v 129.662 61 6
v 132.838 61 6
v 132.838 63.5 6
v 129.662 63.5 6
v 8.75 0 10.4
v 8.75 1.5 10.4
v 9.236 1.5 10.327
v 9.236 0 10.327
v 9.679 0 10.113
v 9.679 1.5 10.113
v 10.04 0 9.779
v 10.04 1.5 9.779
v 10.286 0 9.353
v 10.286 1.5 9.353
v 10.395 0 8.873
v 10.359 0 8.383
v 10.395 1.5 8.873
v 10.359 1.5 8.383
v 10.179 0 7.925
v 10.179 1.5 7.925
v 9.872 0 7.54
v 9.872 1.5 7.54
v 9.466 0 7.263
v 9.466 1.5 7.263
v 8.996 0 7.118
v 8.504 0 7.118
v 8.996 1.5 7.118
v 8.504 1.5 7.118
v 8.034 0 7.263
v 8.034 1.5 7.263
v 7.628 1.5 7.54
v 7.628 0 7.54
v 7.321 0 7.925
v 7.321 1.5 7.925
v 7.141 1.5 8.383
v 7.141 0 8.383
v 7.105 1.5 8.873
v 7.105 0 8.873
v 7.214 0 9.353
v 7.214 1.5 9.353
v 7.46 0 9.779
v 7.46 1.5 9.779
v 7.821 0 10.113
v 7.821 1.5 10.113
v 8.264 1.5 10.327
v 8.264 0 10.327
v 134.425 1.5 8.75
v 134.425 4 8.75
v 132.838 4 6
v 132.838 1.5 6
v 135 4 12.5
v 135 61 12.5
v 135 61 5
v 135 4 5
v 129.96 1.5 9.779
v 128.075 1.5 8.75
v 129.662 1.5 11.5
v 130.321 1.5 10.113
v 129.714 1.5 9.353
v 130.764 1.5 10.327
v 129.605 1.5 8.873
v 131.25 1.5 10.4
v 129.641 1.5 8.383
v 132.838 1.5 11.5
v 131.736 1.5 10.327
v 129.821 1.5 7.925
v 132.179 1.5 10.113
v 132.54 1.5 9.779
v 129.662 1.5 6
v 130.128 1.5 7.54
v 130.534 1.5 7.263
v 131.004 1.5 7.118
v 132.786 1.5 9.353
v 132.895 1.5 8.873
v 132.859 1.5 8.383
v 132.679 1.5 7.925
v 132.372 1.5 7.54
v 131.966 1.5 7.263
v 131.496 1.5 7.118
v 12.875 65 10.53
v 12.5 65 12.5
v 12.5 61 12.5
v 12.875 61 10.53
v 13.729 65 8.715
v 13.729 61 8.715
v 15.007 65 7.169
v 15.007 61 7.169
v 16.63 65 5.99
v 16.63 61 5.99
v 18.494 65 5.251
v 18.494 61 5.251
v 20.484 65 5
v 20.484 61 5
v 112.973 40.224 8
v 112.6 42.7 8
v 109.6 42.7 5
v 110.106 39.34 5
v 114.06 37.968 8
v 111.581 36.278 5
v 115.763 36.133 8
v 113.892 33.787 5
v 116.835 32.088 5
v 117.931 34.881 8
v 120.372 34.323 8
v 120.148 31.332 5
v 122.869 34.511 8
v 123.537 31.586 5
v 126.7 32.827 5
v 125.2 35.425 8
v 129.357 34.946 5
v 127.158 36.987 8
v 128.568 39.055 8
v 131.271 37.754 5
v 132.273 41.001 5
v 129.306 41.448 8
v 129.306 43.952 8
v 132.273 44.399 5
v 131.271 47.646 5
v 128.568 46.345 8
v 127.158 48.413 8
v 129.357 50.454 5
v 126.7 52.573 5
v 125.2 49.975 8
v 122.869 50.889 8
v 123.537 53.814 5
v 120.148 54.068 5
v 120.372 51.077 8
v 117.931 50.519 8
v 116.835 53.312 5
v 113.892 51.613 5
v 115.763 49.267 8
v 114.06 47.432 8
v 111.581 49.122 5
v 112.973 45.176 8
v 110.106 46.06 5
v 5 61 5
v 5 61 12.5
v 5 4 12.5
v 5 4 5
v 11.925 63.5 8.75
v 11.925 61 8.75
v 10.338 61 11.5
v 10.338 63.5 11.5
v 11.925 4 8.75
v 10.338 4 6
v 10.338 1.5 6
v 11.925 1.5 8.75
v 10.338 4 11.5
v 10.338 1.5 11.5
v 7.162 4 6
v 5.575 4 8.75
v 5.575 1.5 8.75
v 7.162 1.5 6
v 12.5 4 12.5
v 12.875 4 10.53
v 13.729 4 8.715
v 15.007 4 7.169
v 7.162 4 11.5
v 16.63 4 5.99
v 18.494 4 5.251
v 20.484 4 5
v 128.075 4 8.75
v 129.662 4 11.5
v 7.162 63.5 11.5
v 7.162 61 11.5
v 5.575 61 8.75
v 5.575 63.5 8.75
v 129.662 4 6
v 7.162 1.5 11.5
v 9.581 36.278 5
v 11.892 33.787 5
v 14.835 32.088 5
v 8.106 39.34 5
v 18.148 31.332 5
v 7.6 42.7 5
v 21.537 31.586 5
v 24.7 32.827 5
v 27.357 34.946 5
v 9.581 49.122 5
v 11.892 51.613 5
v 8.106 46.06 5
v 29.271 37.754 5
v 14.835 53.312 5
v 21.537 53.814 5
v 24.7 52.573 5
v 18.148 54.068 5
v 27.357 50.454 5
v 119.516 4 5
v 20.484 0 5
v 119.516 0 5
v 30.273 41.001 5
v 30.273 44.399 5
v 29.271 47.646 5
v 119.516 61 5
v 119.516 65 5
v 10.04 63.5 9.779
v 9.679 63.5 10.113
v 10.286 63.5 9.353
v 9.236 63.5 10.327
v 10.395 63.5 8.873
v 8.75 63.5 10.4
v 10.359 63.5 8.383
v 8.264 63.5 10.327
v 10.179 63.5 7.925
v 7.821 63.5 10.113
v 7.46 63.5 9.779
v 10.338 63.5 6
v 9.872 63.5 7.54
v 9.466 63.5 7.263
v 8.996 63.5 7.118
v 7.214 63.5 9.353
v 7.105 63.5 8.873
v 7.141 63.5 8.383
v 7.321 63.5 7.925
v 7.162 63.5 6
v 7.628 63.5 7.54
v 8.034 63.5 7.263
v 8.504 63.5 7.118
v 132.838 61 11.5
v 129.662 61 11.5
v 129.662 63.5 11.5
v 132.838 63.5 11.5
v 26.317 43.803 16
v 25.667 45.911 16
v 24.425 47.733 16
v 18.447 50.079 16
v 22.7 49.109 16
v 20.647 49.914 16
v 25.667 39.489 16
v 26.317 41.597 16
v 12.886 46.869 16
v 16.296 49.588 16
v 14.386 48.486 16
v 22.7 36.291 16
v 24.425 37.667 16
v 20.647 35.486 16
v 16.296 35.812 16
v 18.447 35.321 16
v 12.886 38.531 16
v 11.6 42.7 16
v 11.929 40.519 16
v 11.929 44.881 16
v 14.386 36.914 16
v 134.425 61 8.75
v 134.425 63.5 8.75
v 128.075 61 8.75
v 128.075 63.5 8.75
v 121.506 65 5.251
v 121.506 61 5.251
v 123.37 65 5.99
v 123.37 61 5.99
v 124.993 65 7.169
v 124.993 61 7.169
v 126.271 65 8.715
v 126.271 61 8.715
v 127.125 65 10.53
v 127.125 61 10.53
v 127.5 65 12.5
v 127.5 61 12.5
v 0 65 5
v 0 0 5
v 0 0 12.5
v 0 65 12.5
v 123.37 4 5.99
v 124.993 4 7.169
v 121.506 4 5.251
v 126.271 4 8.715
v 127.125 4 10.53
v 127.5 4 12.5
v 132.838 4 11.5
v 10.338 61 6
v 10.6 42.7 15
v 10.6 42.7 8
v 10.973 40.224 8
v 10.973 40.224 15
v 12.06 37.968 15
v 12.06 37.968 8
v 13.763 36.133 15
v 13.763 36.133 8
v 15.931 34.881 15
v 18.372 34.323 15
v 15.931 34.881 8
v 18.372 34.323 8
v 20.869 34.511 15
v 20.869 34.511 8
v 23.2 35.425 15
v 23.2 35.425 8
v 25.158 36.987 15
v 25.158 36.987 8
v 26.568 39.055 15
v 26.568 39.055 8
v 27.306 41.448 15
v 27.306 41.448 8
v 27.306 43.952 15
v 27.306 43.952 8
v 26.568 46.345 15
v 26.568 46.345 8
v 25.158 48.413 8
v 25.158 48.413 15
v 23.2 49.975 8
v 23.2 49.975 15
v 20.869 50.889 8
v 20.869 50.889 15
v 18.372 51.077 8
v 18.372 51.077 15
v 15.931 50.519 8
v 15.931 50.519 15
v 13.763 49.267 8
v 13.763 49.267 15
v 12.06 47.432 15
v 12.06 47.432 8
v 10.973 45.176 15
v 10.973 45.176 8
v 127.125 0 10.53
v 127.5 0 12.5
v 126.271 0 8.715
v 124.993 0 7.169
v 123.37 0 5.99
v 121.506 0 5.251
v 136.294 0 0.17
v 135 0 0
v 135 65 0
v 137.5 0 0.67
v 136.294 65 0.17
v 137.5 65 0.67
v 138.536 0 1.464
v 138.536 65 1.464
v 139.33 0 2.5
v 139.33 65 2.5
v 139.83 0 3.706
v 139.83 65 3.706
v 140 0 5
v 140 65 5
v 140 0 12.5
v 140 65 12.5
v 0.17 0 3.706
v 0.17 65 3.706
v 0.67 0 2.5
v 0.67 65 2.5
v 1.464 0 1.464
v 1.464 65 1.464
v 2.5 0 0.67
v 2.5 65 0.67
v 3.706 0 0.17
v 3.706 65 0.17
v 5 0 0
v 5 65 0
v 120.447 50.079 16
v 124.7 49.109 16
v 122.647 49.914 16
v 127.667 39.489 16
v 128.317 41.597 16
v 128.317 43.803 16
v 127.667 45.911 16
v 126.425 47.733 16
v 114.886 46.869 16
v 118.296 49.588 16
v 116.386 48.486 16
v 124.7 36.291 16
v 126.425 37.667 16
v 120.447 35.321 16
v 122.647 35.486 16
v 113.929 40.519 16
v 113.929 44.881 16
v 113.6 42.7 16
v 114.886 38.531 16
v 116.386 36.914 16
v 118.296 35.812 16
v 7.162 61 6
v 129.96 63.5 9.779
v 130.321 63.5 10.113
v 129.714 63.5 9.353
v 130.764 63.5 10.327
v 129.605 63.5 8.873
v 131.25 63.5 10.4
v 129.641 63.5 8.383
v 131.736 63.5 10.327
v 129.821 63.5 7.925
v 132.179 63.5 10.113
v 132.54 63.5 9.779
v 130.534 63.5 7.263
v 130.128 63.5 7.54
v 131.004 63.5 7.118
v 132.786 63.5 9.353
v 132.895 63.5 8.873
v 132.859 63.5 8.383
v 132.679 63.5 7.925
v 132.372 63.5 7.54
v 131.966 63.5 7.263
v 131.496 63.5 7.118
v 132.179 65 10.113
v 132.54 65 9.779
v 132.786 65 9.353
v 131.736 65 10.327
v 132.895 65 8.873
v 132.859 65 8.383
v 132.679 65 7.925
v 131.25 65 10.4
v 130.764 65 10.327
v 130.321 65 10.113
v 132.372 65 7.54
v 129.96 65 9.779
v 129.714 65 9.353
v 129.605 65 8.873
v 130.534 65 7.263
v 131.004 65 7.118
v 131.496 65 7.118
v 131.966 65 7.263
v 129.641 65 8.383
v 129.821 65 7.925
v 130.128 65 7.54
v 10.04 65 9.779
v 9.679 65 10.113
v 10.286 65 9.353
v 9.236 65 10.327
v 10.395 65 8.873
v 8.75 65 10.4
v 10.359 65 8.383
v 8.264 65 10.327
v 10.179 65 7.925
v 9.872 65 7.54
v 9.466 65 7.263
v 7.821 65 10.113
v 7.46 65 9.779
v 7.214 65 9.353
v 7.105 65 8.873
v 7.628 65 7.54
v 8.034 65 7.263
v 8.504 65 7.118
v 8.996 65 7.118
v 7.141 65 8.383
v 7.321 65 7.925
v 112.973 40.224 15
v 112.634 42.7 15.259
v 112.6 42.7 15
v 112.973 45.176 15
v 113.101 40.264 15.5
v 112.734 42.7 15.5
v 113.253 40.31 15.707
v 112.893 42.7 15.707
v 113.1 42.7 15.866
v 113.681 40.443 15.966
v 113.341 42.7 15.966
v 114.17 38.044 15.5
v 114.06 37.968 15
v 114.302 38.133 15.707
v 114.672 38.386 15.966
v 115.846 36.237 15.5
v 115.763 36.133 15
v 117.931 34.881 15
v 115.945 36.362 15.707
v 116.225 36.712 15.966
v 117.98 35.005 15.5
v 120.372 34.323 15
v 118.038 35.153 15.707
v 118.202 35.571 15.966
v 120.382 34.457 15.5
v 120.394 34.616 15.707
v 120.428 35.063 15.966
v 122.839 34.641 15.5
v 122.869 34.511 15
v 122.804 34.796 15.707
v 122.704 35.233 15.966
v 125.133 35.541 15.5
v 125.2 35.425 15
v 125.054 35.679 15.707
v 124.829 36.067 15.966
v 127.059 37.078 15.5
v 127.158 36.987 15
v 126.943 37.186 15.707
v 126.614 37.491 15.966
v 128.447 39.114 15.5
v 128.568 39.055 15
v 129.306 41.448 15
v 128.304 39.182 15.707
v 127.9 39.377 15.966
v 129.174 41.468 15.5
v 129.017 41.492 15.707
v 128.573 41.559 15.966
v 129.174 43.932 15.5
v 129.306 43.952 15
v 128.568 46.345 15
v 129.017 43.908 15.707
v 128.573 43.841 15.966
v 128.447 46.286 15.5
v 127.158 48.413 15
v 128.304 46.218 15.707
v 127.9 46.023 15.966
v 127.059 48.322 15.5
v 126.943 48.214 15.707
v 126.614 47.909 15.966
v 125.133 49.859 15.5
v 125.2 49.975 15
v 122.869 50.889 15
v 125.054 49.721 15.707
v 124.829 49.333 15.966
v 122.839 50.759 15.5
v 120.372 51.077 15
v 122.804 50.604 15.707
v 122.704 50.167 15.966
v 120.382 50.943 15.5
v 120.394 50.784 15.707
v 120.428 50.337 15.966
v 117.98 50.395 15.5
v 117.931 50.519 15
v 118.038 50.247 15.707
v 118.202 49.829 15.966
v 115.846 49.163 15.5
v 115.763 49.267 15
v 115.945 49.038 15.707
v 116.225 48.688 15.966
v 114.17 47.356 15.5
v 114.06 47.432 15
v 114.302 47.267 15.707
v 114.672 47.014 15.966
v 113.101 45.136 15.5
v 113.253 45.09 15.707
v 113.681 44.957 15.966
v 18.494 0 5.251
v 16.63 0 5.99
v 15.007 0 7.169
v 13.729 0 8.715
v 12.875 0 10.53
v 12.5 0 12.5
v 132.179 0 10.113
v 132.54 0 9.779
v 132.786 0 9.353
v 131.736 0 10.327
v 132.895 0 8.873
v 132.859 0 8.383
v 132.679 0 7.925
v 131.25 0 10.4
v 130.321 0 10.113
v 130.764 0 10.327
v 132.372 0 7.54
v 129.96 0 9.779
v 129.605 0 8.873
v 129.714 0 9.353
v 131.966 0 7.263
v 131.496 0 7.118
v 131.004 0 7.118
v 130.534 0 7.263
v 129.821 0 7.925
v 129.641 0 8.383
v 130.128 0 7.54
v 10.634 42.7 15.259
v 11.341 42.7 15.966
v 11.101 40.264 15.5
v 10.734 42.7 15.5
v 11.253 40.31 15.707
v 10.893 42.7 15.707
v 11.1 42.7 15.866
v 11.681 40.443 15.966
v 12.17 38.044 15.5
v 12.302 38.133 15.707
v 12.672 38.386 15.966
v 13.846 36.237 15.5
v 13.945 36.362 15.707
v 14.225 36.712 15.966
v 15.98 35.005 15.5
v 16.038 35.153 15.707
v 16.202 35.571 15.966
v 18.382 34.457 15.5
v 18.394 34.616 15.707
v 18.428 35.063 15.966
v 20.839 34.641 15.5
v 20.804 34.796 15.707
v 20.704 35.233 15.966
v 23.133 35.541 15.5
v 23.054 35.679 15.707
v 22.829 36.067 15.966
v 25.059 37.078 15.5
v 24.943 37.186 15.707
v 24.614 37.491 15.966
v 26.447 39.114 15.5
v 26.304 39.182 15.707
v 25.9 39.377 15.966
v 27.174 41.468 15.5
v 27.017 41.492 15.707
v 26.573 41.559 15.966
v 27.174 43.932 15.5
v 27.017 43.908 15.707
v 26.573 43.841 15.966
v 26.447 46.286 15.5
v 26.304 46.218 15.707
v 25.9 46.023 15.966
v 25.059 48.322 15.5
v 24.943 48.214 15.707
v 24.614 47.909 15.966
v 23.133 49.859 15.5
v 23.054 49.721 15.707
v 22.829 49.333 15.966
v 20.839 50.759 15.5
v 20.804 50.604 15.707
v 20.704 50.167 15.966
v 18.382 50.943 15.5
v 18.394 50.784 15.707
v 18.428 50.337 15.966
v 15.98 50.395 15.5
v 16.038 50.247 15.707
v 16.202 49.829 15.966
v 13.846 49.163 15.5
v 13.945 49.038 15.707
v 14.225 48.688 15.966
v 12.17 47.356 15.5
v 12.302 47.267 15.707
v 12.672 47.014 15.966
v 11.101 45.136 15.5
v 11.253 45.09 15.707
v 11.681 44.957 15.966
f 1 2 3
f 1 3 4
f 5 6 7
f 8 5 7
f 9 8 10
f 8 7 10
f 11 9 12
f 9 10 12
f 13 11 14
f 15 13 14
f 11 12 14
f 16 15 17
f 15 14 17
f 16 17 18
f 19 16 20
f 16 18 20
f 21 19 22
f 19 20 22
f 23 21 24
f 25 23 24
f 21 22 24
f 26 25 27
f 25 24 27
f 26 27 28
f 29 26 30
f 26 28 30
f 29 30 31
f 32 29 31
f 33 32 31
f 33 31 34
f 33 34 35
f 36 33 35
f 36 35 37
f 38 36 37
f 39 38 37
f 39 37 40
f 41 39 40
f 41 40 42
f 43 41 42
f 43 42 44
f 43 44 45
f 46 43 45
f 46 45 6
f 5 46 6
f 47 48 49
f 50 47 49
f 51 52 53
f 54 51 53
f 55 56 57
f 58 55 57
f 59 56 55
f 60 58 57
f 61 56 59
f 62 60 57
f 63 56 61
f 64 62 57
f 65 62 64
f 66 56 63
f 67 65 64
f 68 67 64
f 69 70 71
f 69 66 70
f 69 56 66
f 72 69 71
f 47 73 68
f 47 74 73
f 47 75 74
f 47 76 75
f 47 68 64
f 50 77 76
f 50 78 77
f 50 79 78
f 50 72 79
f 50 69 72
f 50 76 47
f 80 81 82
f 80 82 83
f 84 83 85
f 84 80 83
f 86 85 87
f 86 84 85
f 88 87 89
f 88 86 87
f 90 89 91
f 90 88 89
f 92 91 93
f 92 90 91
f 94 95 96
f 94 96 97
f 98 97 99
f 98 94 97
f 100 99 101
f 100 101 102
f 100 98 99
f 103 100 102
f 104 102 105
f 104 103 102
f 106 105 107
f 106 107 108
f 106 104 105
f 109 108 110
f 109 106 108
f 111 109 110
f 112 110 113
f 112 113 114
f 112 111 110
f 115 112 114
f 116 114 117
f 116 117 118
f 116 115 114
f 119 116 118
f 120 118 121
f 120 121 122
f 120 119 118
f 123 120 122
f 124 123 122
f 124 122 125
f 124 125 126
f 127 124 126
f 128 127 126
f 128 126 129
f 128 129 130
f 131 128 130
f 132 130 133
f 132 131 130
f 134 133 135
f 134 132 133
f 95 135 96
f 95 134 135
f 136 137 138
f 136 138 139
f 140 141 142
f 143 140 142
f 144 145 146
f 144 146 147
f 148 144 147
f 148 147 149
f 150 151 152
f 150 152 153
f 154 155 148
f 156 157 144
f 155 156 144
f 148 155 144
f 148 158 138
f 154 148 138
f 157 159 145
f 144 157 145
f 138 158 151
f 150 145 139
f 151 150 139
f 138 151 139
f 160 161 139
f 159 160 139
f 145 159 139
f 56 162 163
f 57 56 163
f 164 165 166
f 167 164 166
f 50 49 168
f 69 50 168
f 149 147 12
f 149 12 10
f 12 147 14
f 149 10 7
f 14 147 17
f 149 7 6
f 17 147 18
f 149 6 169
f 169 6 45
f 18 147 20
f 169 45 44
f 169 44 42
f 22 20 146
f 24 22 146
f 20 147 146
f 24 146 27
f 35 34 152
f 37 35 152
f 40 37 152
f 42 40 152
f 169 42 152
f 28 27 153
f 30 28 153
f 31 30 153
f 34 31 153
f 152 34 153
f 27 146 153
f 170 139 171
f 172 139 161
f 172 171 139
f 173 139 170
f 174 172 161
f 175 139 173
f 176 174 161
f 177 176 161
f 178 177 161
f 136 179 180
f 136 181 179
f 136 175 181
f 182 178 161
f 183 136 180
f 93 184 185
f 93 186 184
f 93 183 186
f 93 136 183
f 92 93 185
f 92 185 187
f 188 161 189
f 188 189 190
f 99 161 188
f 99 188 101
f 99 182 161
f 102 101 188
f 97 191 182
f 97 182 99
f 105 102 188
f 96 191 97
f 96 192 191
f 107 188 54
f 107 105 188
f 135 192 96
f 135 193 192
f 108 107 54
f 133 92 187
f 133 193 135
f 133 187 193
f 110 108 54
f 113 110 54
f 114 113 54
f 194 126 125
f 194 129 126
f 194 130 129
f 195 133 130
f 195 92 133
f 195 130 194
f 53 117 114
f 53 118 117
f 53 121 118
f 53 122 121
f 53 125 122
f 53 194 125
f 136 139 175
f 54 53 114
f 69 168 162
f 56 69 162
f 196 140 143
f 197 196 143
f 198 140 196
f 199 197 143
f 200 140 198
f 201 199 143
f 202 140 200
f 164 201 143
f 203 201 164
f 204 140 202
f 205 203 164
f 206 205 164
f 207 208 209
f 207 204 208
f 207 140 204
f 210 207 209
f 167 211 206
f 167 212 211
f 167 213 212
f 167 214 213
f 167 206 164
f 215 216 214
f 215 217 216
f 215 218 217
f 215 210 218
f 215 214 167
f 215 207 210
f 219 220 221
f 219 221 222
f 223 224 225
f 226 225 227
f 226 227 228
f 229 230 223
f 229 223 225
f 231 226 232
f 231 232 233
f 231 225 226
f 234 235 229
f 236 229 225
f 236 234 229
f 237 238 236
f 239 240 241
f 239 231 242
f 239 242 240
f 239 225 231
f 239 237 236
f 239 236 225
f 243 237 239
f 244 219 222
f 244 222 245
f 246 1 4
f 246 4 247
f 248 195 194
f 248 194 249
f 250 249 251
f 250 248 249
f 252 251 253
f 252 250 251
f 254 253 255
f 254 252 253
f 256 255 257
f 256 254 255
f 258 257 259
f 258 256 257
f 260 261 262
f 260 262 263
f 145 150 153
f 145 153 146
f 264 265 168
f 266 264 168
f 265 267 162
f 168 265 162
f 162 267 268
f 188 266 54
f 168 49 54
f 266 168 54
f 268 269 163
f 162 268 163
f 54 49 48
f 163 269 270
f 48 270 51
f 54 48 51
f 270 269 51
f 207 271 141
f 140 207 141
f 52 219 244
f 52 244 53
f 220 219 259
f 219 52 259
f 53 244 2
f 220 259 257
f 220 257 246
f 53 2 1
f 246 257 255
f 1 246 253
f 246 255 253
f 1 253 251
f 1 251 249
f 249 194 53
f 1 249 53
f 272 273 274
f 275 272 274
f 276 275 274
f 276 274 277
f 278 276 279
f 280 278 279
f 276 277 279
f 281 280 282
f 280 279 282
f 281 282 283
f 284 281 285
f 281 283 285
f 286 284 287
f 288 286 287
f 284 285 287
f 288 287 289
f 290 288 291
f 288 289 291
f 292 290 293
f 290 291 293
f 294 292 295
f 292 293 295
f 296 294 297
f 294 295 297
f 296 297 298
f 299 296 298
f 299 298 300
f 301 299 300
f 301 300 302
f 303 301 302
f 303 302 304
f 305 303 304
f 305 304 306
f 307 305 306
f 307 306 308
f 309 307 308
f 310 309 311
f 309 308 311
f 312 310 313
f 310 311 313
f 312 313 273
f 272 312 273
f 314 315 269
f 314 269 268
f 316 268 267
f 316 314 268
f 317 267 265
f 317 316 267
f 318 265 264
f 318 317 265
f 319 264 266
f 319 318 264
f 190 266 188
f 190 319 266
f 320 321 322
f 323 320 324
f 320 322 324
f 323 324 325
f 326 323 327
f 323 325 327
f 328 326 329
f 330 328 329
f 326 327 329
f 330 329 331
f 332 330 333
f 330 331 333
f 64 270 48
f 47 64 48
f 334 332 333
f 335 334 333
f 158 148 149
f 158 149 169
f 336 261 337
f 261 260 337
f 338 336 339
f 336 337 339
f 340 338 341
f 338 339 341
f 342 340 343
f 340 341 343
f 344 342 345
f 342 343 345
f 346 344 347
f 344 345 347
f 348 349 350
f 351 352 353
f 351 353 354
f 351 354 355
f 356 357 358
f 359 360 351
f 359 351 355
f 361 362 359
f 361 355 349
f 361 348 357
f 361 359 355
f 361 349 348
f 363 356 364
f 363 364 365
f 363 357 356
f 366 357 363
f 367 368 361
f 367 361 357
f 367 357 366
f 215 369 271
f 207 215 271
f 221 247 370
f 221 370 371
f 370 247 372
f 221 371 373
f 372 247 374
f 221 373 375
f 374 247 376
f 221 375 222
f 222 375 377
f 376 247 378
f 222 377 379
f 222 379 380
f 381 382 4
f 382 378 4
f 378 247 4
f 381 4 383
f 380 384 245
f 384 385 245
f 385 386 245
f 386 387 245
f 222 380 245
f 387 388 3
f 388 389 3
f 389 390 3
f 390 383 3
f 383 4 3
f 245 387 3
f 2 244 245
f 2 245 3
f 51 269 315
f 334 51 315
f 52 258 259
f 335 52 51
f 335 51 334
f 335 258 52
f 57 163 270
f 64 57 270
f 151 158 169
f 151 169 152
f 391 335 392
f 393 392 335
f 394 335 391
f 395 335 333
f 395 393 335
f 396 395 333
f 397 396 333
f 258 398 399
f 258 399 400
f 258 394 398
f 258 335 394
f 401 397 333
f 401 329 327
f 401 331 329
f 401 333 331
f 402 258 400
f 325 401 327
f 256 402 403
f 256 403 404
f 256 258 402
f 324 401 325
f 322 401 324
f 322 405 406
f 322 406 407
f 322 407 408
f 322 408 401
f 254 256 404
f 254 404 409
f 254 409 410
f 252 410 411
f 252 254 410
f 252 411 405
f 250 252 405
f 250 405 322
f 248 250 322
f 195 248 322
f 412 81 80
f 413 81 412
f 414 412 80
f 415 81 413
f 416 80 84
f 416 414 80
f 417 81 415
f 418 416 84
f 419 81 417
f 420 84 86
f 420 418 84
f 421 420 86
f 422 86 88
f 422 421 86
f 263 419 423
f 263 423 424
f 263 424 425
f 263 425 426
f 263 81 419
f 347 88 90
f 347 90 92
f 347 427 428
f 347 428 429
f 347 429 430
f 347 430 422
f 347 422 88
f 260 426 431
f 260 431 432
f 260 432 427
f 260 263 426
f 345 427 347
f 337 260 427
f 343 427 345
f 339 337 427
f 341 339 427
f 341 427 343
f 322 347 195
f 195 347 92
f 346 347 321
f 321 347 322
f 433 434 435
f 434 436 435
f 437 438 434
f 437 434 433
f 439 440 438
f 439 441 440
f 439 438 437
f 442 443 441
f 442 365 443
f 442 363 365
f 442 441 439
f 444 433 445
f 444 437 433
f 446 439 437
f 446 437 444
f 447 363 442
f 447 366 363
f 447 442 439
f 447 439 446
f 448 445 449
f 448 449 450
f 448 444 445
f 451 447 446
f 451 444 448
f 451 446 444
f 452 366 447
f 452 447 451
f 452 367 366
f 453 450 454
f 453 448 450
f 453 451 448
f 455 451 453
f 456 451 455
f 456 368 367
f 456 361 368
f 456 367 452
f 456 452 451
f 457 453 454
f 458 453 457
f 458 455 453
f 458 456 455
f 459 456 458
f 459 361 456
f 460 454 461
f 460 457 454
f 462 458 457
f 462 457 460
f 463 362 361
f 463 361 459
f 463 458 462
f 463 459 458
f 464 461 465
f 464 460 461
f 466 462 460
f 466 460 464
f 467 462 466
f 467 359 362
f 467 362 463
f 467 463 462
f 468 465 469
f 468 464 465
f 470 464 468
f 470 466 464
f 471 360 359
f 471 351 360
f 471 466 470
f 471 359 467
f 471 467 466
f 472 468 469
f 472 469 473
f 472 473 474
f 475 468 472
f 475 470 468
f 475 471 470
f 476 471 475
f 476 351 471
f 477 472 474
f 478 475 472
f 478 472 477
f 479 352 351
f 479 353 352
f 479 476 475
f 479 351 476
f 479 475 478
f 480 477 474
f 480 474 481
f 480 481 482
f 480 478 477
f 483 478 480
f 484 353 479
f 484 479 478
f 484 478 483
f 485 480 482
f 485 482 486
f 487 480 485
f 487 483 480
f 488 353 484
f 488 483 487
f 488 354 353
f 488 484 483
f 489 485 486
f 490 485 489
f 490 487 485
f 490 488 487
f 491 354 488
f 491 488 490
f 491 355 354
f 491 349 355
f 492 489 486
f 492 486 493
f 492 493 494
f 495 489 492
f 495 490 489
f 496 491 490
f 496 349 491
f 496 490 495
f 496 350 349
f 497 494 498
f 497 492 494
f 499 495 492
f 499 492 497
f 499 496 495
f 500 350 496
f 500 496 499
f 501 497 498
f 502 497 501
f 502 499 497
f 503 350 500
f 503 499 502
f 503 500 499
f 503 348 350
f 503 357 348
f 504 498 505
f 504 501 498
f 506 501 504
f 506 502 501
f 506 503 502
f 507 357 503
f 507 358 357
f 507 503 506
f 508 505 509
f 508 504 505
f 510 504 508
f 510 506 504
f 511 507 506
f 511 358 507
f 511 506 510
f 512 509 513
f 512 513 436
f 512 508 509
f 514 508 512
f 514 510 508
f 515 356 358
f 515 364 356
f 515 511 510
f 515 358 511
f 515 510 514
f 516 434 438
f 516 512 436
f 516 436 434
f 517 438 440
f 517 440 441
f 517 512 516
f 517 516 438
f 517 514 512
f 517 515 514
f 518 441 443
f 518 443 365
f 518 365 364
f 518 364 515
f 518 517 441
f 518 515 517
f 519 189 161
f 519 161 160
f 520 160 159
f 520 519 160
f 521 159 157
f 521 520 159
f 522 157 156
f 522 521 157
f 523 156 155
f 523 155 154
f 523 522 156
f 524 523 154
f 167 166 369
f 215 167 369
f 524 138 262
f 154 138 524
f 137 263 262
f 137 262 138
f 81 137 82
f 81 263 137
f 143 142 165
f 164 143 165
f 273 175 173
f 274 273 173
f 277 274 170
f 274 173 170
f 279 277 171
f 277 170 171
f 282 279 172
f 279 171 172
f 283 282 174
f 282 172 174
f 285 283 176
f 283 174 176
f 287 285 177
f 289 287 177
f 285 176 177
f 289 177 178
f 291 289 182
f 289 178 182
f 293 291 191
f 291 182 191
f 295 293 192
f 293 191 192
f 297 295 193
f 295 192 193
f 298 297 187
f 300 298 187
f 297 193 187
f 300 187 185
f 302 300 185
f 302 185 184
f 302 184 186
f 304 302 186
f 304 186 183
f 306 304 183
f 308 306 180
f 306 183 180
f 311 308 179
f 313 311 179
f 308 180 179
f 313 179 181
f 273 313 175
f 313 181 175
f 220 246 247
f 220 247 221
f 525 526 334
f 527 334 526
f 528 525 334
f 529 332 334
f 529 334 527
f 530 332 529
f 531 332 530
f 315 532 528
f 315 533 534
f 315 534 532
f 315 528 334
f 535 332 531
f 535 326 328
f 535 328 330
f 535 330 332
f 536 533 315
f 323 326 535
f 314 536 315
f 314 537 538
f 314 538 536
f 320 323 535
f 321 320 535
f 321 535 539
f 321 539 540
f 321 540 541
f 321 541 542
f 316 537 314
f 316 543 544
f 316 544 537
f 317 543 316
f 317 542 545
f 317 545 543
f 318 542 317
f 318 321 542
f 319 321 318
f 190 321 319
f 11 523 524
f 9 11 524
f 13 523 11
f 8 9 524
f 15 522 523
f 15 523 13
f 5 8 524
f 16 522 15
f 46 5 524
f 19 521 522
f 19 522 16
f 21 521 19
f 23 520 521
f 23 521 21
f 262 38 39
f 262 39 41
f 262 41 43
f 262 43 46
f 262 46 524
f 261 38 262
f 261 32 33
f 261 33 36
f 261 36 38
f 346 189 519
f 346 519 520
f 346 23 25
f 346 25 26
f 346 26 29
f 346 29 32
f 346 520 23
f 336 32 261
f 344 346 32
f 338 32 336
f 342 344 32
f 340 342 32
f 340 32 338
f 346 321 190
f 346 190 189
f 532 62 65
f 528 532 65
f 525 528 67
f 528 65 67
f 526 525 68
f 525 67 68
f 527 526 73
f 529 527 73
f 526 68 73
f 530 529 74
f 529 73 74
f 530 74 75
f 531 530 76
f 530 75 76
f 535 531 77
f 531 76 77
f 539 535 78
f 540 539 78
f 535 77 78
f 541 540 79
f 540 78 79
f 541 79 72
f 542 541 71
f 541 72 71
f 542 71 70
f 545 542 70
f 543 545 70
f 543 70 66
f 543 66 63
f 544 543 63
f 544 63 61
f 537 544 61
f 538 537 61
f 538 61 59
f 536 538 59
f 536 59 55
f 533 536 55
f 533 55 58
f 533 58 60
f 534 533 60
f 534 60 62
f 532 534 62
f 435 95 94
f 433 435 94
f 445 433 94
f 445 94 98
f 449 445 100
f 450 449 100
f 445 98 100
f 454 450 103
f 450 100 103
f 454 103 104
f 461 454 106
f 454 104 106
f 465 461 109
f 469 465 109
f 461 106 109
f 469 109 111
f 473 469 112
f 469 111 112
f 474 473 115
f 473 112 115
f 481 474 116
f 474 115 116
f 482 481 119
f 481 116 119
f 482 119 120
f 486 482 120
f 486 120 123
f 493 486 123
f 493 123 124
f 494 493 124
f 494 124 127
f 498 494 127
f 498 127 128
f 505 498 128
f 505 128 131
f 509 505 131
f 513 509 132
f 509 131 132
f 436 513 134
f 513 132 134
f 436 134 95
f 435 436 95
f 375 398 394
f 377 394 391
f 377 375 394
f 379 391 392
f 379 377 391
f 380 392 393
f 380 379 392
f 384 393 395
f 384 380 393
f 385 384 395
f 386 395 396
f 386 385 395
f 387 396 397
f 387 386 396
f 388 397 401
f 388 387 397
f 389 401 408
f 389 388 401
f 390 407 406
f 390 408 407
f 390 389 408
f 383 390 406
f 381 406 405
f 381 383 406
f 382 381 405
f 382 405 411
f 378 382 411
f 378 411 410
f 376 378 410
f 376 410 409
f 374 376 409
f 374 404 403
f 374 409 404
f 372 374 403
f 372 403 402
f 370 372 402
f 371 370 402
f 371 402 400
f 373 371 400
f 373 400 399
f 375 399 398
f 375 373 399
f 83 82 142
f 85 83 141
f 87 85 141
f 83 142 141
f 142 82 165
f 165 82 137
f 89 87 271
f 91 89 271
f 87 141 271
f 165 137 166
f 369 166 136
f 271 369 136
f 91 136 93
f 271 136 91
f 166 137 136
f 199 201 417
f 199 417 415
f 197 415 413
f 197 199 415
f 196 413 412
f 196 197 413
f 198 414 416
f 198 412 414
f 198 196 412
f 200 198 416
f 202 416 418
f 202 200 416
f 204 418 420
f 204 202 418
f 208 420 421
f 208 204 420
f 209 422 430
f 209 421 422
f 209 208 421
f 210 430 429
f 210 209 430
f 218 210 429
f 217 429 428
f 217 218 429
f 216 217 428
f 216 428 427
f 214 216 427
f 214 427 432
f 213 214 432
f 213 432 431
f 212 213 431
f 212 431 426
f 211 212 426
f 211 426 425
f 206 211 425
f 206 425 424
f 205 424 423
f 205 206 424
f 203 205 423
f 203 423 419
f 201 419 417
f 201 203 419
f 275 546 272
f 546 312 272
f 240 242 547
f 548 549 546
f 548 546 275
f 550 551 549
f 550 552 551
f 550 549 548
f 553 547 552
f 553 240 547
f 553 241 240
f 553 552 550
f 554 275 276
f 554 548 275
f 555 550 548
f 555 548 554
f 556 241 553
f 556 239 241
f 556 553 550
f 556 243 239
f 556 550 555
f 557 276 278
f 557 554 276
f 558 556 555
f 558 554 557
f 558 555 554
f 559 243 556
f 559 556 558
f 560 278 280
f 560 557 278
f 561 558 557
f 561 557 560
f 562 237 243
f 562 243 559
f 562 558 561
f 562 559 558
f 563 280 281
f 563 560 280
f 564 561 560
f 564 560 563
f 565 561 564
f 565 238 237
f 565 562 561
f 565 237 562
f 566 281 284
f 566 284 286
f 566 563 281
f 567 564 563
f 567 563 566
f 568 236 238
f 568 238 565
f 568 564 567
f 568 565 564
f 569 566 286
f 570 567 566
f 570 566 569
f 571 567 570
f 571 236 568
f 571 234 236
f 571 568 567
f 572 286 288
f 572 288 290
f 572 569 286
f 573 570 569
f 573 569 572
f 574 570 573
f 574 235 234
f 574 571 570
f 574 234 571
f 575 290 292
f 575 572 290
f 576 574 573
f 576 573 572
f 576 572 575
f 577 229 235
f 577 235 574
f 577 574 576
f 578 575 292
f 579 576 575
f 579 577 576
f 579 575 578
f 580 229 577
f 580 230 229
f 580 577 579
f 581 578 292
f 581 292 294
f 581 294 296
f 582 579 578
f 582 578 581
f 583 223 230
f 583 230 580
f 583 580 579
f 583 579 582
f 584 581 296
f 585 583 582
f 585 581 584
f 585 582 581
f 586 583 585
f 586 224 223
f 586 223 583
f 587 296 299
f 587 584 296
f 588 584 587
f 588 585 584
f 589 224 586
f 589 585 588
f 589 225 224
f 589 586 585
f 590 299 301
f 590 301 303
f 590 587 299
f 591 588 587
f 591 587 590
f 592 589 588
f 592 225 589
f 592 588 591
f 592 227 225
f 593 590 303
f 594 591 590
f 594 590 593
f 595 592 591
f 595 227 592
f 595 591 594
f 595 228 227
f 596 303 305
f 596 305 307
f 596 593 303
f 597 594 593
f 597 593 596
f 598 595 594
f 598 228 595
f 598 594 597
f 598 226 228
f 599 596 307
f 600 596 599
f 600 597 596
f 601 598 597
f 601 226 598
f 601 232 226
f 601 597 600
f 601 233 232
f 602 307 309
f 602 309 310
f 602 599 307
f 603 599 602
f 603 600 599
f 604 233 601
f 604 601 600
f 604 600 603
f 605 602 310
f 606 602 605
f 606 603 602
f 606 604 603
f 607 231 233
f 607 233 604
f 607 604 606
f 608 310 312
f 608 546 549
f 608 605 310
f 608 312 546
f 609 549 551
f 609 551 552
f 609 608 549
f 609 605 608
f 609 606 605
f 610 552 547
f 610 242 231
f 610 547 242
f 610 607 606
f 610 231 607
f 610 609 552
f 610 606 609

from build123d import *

# Parameters (mm, degrees)
SKETCH1_W            = 140
SKETCH1_H            = 65
BOSS_EXTRUDE1_DEPTH  = 12.5
SKETCH3_W            = 130
SKETCH3_H            = 7.5
CUT_EXTRUDE1_DEPTH   = 155.858806659
FILLET1_R            = 5
SKETCH4_W            = 7.5
SKETCH4_H            = 7.5
BOSS_EXTRUDE2_DEPTH  = 4
SKETCH5_R            = 1.65
CUT_EXTRUDE2_DEPTH   = 2.5
SKETCH5_3_R          = 1.65
CUT_EXTRUDE3_DEPTH   = 154.222876882
FILLET2_R            = 8
FILLET2_OF_MIRROR1_R = 8
SKETCH7_R            = 8.4
BOSS_EXTRUDE3_DEPTH  = 11
FILLET3_R            = 1
CHAMFER1_SIZE        = 3


with BuildPart() as part:
    # Sketch1 → Boss-Extrude1 (new body)
    with BuildSketch(Plane.XY):
        with Locations((70, 32.5)):
            Rectangle(SKETCH1_W, SKETCH1_H)
    extrude(amount=BOSS_EXTRUDE1_DEPTH)

    # Sketch3 → Cut-Extrude1 (cut, through all)
    with BuildSketch(Plane(origin=(0, 65, 0), x_dir=(1, 0, 0), z_dir=(0, 1, 0))):
        with Locations((70, -8.75)):
            Rectangle(SKETCH3_W, SKETCH3_H)
    extrude(amount=-CUT_EXTRUDE1_DEPTH, mode=Mode.SUBTRACT)

    # Fillet1
    fillet1_edges = [part.edges().sort_by_distance(p)[0] for p in [
        (140, 32.5, 0),
        (0, 32.5, 0),
    ]]
    fillet(fillet1_edges, radius=FILLET1_R)

    # Sketch4 → Boss-Extrude2 (add)
    with BuildSketch(Plane.XZ):
        with Locations((8.75, 8.75)):
            Rectangle(SKETCH4_W, SKETCH4_H)
        with Locations((131.25, 8.75)):
            Rectangle(SKETCH4_W, SKETCH4_H)
    boss_extrude2 = extrude(amount=-BOSS_EXTRUDE2_DEPTH)

    # Sketch5 → Cut-Extrude2 (cut)
    # profile 1 of 2: a face of its own
    with BuildSketch(Plane(origin=(0, 4, 0), x_dir=(1, 0, 0), z_dir=(0, 1, 0))):
        Polygon((134.425426481, -8.75), (132.83771324, -6), (129.66228676, -6), (128.074573519, -8.75), (129.66228676, -11.5), (132.83771324, -11.5), align=None)
        with Locations(Location((131.25, -8.75, 0), (0, 0, 270))):
            Circle(SKETCH5_R, mode=Mode.SUBTRACT)
    # profile 2 of 2: a face of its own
    with BuildSketch(Plane(origin=(0, 4, 0), x_dir=(1, 0, 0), z_dir=(0, 1, 0))):
        Polygon((10.33771324, -6), (11.925426481, -8.75), (10.33771324, -11.5), (7.16228676, -11.5), (5.574573519, -8.75), (7.16228676, -6), align=None)
        with Locations(Location((8.75, -8.75, 0), (0, 0, 90))):
            Circle(SKETCH5_R, mode=Mode.SUBTRACT)
    cut_extrude2 = extrude(amount=-CUT_EXTRUDE2_DEPTH, mode=Mode.SUBTRACT)

    # Sketch5<3> → Cut-Extrude3 (cut, through all)
    with BuildSketch(Plane(origin=(0, 4, 0), x_dir=(1, 0, 0), z_dir=(0, 1, 0))):
        with Locations(Location((8.75, -8.75, 0), (0, 0, 270))):
            Circle(SKETCH5_3_R)
        with Locations(Location((131.25, -8.75, 0), (0, 0, 270))):
            Circle(SKETCH5_3_R)
    cut_extrude3 = extrude(amount=-CUT_EXTRUDE3_DEPTH, mode=Mode.SUBTRACT)

    # Fillet2
    # the kernel refuses this fillet: 8 mm, written as the material it adds along each edge
    with BuildSketch(Plane(origin=(127.5, 0, 5), x_dir=(-1, 0, 0), z_dir=(0, 1, 0))) as fillet2_piece_1:
        with BuildLine():
            CenterArc((7.984359711, 8), FILLET2_R, 183.583321698, 86.416678302)
            Line((0, 7.5), (-0.159687194, 7.49))
            ThreePointArc((-0.159687194, 7.49), (-0.16, 3.75), (-0.16, 0))
            Line((-0.16, 0), (0, -0.16))
            Line((0, -0.16), (7.984359711, -0.16))
            Line((7.984359711, -0.16), (7.984359711, 0))
        make_face()
    extrude(amount=4)
    with BuildSketch(Plane(origin=(12.5, 0, 5), x_dir=(1, 0, 0), z_dir=(0, 1, 0))) as fillet2_piece_2:
        with BuildLine():
            CenterArc((7.984359711, -8), FILLET2_R, 90, 86.416678302)
            Line((0, -7.5), (-0.159687194, -7.49))
            ThreePointArc((-0.159687194, -7.49), (-0.16, -3.75), (-0.16, 0))
            Line((-0.16, 0), (0, 0.16))
            Line((0, 0.16), (7.984359711, 0.16))
            Line((7.984359711, 0.16), (7.984359711, 0))
        make_face()
    extrude(amount=4)

    # Mirror1: Boss-Extrude2, Cut-Extrude2, Cut-Extrude3 across plane
    add(boss_extrude2.mirror(Plane.ZX.offset(32.5)))
    add(cut_extrude2.mirror(Plane.ZX.offset(32.5)), mode=Mode.SUBTRACT)
    add(cut_extrude3.mirror(Plane.ZX.offset(32.5)), mode=Mode.SUBTRACT)

    # Fillet2 of Mirror1
    # the kernel refuses this fillet: 8 mm, written as the material it adds along each edge
    with BuildSketch(Plane(origin=(127.5, 65, 5), x_dir=(0, 0, 1), z_dir=(0, -1, 0))) as fillet2_of_mirror1_piece_1:
        with BuildLine():
            CenterArc((8, 7.984359711), FILLET2_OF_MIRROR1_R, 180, 86.416678302)
            Line((0, 7.984359711), (-0.16, 7.984359711))
            Line((-0.16, 7.984359711), (-0.16, 0))
            Line((-0.16, 0), (0, -0.16))
            ThreePointArc((0, -0.16), (3.75, -0.16), (7.49, -0.159687194))
            Line((7.49, -0.159687194), (7.5, 0))
        make_face()
    extrude(amount=4)
    with BuildSketch(Plane(origin=(12.5, 65, 5), x_dir=(0, 0, 1), z_dir=(0, -1, 0))) as fillet2_of_mirror1_piece_2:
        with BuildLine():
            CenterArc((8, -7.984359711), FILLET2_OF_MIRROR1_R, 93.583321698, 86.416678302)
            Line((0, -7.984359711), (-0.16, -7.984359711))
            Line((-0.16, -7.984359711), (-0.16, 0))
            Line((-0.16, 0), (0, 0.16))
            ThreePointArc((0, 0.16), (3.75, 0.16), (7.49, 0.159687194))
            Line((7.49, 0.159687194), (7.5, 0))
        make_face()
    extrude(amount=4)

    # Sketch7 → Boss-Extrude3 (add)
    with BuildSketch(Plane.XY.offset(5)):
        with Locations(Location((121, 42.7, 0), (0, 0, 180))):
            Circle(SKETCH7_R)
        with Locations(Location((19, 42.7, 0), (0, 0, 180))):
            Circle(SKETCH7_R)
    extrude(amount=BOSS_EXTRUDE3_DEPTH)

    # Fillet3
    fillet3_edges = [part.edges().sort_by_distance(p)[0] for p in [
        (129.4, 42.7, 16),
        (27.4, 42.7, 16),
    ]]
    fillet(fillet3_edges, radius=FILLET3_R)

    # Chamfer1
    chamfer1_edges = [part.edges().sort_by_distance(p)[0] for p in [
        (129.4, 42.7, 5),
        (27.4, 42.7, 5),
    ]]
    chamfer(chamfer1_edges, length=CHAMFER1_SIZE)


solid = part.part
